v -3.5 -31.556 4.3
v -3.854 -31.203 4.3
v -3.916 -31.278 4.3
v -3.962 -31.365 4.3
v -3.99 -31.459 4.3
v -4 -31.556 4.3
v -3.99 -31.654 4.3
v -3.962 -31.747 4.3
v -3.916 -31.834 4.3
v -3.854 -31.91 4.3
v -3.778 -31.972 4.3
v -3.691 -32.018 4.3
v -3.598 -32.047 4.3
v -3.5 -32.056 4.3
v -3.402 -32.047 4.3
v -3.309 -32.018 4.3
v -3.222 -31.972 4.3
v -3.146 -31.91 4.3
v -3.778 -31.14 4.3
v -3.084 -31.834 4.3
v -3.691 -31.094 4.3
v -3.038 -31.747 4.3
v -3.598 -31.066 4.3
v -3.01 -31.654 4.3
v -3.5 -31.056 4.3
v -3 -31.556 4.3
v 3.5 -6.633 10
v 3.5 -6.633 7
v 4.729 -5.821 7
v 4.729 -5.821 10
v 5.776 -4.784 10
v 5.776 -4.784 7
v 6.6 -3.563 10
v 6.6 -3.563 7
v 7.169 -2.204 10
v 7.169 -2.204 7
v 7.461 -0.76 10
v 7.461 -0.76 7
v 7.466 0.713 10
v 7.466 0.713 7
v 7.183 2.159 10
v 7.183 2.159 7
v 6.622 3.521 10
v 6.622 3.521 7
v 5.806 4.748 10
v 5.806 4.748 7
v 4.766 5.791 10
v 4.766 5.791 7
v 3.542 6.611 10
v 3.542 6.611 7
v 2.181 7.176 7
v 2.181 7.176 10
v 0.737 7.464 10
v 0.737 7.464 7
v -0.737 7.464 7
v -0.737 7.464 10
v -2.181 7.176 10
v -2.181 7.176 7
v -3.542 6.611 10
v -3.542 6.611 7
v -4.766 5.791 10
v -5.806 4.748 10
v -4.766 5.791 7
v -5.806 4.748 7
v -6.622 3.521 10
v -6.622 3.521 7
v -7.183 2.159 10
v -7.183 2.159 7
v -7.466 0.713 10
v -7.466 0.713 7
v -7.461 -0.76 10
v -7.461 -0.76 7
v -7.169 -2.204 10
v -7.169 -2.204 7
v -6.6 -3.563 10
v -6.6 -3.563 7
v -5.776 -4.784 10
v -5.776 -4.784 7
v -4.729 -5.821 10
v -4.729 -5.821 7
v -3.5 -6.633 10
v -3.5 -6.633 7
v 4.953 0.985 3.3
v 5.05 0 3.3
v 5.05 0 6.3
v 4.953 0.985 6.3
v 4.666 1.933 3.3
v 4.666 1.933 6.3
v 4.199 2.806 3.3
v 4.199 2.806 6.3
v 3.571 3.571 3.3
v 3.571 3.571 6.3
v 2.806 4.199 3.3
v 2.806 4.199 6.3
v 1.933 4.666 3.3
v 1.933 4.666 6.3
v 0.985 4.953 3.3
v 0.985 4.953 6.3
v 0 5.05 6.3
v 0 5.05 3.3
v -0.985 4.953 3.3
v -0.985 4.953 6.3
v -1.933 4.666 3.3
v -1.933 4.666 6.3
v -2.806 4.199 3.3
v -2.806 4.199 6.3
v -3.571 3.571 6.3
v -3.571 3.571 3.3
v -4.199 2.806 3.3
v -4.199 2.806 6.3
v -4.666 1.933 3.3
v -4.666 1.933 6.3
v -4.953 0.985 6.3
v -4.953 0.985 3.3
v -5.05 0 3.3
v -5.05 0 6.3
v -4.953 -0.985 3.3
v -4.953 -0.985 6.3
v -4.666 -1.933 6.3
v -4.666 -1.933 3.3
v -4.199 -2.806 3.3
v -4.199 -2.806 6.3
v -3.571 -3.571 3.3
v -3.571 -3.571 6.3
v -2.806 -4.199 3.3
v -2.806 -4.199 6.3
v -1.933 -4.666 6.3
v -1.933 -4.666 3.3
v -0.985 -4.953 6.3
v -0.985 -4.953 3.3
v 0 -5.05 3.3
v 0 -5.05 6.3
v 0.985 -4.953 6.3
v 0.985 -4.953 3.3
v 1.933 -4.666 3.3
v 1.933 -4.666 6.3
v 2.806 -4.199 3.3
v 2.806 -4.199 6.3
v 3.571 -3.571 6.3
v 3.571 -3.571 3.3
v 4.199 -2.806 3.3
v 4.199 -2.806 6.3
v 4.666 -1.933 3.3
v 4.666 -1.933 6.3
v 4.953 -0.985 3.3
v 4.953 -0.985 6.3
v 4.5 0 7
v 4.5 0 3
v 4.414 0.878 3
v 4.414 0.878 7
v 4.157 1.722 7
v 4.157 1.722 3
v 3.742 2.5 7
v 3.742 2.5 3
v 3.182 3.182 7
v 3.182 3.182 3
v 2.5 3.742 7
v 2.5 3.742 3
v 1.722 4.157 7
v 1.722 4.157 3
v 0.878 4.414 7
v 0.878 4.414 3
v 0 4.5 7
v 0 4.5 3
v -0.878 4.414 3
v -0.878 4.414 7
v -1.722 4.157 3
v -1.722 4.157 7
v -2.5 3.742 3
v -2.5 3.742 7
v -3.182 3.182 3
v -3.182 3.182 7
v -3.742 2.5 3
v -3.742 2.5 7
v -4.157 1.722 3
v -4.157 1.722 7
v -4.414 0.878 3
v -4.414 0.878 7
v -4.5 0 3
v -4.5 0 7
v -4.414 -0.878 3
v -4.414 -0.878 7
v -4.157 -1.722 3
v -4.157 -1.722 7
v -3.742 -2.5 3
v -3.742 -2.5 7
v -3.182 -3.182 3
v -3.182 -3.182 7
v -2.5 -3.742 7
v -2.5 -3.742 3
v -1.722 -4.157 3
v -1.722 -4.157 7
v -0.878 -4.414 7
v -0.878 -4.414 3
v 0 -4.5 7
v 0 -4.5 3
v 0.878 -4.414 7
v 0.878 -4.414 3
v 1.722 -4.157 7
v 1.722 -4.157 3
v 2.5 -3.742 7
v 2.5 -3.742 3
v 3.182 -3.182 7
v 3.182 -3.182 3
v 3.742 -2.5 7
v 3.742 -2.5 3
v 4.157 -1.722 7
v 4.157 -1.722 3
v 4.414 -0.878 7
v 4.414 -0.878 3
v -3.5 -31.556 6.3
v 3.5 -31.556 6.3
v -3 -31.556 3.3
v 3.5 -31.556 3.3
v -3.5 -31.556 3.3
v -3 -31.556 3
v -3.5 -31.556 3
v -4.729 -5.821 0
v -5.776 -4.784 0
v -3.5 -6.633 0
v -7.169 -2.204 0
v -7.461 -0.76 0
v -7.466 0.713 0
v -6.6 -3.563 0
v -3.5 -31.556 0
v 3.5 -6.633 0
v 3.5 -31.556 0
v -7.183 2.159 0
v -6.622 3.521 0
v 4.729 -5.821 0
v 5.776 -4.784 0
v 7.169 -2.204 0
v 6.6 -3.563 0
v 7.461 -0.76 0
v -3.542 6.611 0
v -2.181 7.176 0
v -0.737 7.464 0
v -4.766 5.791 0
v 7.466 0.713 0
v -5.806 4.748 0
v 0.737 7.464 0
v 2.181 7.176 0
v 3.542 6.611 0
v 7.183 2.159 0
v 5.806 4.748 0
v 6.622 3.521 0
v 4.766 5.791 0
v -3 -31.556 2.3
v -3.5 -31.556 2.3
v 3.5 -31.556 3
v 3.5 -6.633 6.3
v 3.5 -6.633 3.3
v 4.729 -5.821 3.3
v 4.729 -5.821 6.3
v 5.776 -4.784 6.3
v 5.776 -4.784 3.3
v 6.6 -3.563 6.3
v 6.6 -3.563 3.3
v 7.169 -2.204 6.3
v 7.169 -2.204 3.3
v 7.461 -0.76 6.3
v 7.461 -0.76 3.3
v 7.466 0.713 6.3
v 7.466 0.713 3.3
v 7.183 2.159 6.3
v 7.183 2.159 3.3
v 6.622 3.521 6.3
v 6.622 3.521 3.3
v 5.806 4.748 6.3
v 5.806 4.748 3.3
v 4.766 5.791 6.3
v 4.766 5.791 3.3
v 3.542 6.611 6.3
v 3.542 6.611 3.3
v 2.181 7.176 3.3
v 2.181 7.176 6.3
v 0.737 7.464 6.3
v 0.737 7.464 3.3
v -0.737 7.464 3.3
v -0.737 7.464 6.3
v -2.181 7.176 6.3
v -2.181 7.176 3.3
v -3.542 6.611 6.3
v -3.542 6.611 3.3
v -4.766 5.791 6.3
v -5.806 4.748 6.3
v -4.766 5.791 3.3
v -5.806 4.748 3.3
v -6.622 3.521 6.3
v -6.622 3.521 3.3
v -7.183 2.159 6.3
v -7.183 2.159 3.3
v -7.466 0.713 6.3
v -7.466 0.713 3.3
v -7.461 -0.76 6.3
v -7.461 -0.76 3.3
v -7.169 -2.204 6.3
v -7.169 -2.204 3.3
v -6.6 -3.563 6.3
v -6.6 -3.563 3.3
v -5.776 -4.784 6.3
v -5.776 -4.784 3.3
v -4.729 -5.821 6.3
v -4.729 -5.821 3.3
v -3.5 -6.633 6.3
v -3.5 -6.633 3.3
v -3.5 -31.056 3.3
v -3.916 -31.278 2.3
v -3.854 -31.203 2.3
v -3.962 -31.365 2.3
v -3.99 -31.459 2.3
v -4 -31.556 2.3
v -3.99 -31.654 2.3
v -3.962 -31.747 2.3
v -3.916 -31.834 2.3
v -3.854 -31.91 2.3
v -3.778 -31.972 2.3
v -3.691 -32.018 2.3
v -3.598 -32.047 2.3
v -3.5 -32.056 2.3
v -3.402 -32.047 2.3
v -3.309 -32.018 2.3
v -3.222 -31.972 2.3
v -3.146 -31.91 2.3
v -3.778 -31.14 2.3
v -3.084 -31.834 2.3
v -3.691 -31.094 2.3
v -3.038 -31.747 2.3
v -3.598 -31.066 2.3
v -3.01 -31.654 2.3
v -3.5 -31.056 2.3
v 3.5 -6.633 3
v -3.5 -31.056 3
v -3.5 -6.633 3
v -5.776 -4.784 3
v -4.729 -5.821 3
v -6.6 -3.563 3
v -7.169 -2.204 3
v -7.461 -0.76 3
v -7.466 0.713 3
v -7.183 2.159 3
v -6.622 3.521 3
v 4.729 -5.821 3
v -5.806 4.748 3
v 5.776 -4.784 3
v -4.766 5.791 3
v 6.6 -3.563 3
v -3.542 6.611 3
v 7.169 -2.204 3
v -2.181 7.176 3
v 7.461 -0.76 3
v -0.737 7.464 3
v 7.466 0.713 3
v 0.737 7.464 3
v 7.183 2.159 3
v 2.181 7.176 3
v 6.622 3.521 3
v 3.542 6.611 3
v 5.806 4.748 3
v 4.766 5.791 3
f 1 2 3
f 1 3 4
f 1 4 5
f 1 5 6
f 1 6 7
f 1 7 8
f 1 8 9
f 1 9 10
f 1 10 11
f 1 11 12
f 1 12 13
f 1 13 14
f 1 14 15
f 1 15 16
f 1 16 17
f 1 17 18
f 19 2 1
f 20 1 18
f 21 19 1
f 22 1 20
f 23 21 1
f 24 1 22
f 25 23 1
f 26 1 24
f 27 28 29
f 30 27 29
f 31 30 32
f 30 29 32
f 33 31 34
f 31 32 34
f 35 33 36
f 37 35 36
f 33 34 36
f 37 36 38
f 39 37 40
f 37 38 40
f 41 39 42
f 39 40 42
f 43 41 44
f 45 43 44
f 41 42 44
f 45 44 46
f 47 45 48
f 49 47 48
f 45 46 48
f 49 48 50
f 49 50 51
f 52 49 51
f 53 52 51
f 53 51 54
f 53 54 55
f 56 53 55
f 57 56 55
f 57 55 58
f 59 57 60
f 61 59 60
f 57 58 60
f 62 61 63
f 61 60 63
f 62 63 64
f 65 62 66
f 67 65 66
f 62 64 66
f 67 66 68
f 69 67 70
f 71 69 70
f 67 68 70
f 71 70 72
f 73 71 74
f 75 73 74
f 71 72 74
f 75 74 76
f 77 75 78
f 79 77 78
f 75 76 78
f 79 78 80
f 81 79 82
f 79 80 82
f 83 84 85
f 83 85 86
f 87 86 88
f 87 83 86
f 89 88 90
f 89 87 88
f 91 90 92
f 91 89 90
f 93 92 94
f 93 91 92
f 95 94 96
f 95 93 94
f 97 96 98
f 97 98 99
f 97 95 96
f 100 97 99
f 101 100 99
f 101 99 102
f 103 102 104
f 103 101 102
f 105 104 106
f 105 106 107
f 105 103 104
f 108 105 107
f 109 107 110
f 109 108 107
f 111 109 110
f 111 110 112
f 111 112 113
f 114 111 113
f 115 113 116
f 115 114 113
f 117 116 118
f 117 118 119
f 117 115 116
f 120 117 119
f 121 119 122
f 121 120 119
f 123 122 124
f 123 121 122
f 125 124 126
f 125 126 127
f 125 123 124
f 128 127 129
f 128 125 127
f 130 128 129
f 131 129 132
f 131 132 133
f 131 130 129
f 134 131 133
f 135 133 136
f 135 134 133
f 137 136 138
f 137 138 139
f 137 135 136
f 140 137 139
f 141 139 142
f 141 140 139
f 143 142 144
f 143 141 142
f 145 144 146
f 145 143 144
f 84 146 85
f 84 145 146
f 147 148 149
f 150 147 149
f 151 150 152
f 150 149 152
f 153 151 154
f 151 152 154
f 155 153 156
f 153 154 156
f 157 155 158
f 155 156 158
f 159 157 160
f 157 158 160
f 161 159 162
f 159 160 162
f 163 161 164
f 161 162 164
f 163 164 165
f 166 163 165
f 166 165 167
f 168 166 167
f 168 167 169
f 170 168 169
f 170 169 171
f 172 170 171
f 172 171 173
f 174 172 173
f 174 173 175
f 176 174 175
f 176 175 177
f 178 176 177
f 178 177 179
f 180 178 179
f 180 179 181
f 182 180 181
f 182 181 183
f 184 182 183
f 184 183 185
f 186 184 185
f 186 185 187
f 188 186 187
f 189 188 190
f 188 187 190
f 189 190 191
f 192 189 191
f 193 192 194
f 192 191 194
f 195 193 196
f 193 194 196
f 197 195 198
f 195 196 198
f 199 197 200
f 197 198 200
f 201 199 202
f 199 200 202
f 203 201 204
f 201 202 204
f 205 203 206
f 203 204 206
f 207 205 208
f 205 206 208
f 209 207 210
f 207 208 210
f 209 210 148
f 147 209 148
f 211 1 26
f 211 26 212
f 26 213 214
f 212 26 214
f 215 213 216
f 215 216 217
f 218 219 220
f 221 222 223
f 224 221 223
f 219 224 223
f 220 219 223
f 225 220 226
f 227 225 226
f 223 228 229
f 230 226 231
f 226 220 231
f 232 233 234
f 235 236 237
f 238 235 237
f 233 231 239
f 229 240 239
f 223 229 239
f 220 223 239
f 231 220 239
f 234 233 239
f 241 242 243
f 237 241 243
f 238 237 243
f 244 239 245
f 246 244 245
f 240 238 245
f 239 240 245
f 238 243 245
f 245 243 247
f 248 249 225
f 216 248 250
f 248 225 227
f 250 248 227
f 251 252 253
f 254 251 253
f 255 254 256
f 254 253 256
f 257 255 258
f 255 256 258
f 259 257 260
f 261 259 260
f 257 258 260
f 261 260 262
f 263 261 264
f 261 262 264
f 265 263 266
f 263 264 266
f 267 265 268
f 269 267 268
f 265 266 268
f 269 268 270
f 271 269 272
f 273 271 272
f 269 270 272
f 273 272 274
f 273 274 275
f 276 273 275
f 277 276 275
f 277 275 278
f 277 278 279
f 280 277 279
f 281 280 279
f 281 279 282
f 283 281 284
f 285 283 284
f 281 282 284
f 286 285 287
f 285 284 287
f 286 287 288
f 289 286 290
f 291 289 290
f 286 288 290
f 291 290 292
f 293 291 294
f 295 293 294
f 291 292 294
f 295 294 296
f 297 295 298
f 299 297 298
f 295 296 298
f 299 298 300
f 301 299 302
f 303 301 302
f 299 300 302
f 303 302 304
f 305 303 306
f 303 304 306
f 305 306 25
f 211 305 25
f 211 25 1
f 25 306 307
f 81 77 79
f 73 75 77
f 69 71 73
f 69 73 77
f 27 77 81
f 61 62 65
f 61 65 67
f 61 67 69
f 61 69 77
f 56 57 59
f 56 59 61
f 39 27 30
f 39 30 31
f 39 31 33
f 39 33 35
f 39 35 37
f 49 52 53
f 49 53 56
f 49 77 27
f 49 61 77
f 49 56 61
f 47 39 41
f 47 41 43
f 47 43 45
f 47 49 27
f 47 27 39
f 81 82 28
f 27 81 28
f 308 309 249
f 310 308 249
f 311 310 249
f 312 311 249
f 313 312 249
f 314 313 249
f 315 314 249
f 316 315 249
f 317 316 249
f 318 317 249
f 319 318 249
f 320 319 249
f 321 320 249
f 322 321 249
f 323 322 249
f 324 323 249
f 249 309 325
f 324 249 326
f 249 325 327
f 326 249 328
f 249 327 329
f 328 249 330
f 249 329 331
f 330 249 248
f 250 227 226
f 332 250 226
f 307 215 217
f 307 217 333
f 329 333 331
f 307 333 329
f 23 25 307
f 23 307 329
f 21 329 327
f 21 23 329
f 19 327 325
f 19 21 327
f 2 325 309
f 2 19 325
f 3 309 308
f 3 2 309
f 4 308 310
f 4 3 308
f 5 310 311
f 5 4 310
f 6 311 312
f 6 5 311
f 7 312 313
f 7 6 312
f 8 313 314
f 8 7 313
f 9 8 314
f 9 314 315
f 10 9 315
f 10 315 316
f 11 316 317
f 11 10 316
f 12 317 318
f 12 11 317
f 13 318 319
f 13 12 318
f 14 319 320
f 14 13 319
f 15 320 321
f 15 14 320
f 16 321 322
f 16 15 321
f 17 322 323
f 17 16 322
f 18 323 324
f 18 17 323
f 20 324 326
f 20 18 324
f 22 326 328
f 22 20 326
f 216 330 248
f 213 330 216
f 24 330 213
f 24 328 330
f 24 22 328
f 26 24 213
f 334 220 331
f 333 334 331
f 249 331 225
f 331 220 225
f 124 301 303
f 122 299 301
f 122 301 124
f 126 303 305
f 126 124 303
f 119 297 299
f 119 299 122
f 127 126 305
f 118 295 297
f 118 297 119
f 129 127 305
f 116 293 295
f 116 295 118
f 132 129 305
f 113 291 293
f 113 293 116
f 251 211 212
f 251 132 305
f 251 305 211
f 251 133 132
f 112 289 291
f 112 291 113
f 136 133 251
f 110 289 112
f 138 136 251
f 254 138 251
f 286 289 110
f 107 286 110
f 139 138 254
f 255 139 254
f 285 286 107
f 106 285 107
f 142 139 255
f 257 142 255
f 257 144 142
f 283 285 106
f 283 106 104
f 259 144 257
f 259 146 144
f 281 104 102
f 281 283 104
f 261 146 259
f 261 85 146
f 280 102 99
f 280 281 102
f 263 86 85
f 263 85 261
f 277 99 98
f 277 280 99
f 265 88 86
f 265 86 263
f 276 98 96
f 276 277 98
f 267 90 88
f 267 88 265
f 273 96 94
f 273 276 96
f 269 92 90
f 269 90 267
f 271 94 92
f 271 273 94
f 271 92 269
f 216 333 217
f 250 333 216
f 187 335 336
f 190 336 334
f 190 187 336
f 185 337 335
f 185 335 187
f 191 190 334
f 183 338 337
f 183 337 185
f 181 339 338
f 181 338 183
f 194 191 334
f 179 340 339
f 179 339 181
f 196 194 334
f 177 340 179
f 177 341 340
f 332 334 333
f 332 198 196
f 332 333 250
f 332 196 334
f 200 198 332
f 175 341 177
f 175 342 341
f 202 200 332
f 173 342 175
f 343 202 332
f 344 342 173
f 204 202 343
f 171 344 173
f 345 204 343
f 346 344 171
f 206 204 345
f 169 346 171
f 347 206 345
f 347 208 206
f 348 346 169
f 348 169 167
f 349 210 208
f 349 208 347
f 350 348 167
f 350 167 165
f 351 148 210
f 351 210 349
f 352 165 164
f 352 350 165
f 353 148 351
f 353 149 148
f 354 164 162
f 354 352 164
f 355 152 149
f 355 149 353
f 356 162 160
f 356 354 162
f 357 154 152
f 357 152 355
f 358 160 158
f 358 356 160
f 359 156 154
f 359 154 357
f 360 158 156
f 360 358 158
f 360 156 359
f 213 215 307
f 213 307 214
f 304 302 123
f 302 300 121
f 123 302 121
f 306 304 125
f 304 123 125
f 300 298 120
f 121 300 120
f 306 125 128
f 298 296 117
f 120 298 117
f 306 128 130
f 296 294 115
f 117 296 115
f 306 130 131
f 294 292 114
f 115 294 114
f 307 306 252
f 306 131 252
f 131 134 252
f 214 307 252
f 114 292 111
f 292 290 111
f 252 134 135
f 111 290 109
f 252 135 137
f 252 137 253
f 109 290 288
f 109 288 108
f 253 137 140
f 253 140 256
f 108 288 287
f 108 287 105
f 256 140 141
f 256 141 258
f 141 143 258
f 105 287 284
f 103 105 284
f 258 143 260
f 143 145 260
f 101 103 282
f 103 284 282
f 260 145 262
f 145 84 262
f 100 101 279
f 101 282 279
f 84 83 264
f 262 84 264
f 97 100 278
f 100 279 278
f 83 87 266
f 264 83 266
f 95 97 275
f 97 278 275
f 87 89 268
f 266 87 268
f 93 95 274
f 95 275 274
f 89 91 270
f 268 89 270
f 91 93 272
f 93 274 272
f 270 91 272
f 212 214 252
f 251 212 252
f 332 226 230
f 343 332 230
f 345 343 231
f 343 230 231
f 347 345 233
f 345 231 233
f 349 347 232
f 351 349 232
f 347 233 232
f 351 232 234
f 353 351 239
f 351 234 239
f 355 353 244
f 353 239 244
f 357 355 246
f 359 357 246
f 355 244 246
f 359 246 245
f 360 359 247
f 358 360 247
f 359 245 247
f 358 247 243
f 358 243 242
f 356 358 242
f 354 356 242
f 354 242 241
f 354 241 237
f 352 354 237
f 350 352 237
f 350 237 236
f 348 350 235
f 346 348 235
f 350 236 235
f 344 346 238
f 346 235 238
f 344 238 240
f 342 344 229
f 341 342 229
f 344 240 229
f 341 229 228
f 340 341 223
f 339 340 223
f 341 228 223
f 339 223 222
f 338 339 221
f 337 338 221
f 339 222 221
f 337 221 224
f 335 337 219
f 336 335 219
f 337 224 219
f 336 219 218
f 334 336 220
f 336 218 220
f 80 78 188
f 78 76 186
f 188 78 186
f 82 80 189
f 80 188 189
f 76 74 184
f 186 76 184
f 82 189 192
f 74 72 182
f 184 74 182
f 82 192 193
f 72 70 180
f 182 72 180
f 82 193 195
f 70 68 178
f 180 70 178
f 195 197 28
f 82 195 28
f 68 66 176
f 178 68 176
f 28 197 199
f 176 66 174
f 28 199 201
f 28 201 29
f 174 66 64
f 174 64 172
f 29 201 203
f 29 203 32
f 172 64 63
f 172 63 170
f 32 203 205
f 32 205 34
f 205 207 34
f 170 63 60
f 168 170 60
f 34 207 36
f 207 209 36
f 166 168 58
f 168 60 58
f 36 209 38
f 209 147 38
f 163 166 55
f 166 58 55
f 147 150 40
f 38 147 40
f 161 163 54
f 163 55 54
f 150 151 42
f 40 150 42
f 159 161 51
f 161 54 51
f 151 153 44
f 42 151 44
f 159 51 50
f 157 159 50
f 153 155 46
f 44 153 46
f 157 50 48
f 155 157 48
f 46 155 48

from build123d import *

# Parameters (mm, degrees)
F2_R          = 5.05
F3_DEPTH      = 3
F0_R          = 4.5
F4_DEPTH      = 3
F5_DEPTH      = 7
F8_DEPTH      = 3
F9_DEPTH      = 1
F9_DEPTH_BACK = 1


with BuildPart() as f3:
    # F2 (on offset) → F3 (new body)
    with BuildSketch(Plane.XY.offset(3.3)):
        with BuildLine():
            ThreePointArc((-3, -31.5561521365), (-3.1464466094, -31.2025987459), (-3.5, -31.0561521365))
            Line((-3.5, -31.0561521365), (-3.5, -31.5561521365))
            Line((-3.5, -31.5561521365), (-3, -31.5561521365))
        make_face()
        with BuildLine():
            Line((3.5, -6.6332495807), (3.5, -5.5217424324))
            Line((3.5, -5.5217424324), (-3.5, -5.5217424324))
            Line((-3.5, -5.5217424324), (-3.5, -6.6332495807))
            Line((-3.5, -6.6332495807), (-3.5, -31.0561521365))
            ThreePointArc((-3.5, -31.0561521365), (-3.1464466094, -31.2025987459), (-3, -31.5561521365))
            Line((-3, -31.5561521365), (3.5, -31.5561521365))
            Line((3.5, -31.5561521365), (3.5, -6.6332495807))
        make_face()
        with BuildLine():
            Line((-3.5, -5.5217424324), (3.5, -5.5217424324))
            Line((3.5, -5.5217424324), (3.5, -6.6332495807))
            ThreePointArc((3.5, -6.6332495807), (0, 7.5), (-3.5, -6.6332495807))
            Line((-3.5, -6.6332495807), (-3.5, -5.5217424324))
        make_face()
        Circle(F2_R, mode=Mode.SUBTRACT)
    extrude(amount=F3_DEPTH)



with BuildPart() as f4:
    # F0 (on Top) → F4 (new body)
    with BuildSketch(Plane.XY):
        Polygon((3.5, -31.5561521365), (3.5, -6.6332495807), (3.5, -5.5217424324), (-3.5, -5.5217424324), (-3.5, -6.6332495807), (-3.5, -31.5561521365), align=None)
        with BuildLine():
            Line((3.5, -5.5217424324), (3.5, -6.6332495807))
            ThreePointArc((3.5, -6.6332495807), (0, 7.5), (-3.5, -6.6332495807))
            Line((-3.5, -6.6332495807), (-3.5, -5.5217424324))
            Line((-3.5, -5.5217424324), (3.5, -5.5217424324))
        make_face()
        Circle(F0_R, mode=Mode.SUBTRACT)
        Circle(F0_R)
    extrude(amount=F4_DEPTH)

    # F0 (on Top) → F5 (join)
    with BuildSketch(Plane.XY):
        Circle(F0_R)
    extrude(amount=F5_DEPTH)

    # F7 (on offset) → F8 (join)
    with BuildSketch(Plane.XY.offset(7)):
        with BuildLine():
            Line((-3.5, -6.6332495807), (3.5, -6.6332495807))
            ThreePointArc((3.5, -6.6332495807), (0, 7.5), (-3.5, -6.6332495807))
        make_face()
    extrude(amount=F8_DEPTH)


with BuildPart() as f3_1:
    add(f3.part)

    add(f4.part)  # F9 merges F4
    # F2 (on offset) → F9 (join, two sides)
    with BuildSketch(Plane.XY.offset(3.3)) as f9_sk:
        with BuildLine():
            Line((-3.5, -31.5561521365), (-3.5, -31.0561521365))
            ThreePointArc((-3.5, -31.0561521365), (-3.8535533906, -31.9097055271), (-3, -31.5561521365))
            Line((-3, -31.5561521365), (-3.5, -31.5561521365))
        make_face()
    extrude(amount=F9_DEPTH)
    extrude(f9_sk.sketch, amount=-F9_DEPTH_BACK)


solid = f3_1.part
